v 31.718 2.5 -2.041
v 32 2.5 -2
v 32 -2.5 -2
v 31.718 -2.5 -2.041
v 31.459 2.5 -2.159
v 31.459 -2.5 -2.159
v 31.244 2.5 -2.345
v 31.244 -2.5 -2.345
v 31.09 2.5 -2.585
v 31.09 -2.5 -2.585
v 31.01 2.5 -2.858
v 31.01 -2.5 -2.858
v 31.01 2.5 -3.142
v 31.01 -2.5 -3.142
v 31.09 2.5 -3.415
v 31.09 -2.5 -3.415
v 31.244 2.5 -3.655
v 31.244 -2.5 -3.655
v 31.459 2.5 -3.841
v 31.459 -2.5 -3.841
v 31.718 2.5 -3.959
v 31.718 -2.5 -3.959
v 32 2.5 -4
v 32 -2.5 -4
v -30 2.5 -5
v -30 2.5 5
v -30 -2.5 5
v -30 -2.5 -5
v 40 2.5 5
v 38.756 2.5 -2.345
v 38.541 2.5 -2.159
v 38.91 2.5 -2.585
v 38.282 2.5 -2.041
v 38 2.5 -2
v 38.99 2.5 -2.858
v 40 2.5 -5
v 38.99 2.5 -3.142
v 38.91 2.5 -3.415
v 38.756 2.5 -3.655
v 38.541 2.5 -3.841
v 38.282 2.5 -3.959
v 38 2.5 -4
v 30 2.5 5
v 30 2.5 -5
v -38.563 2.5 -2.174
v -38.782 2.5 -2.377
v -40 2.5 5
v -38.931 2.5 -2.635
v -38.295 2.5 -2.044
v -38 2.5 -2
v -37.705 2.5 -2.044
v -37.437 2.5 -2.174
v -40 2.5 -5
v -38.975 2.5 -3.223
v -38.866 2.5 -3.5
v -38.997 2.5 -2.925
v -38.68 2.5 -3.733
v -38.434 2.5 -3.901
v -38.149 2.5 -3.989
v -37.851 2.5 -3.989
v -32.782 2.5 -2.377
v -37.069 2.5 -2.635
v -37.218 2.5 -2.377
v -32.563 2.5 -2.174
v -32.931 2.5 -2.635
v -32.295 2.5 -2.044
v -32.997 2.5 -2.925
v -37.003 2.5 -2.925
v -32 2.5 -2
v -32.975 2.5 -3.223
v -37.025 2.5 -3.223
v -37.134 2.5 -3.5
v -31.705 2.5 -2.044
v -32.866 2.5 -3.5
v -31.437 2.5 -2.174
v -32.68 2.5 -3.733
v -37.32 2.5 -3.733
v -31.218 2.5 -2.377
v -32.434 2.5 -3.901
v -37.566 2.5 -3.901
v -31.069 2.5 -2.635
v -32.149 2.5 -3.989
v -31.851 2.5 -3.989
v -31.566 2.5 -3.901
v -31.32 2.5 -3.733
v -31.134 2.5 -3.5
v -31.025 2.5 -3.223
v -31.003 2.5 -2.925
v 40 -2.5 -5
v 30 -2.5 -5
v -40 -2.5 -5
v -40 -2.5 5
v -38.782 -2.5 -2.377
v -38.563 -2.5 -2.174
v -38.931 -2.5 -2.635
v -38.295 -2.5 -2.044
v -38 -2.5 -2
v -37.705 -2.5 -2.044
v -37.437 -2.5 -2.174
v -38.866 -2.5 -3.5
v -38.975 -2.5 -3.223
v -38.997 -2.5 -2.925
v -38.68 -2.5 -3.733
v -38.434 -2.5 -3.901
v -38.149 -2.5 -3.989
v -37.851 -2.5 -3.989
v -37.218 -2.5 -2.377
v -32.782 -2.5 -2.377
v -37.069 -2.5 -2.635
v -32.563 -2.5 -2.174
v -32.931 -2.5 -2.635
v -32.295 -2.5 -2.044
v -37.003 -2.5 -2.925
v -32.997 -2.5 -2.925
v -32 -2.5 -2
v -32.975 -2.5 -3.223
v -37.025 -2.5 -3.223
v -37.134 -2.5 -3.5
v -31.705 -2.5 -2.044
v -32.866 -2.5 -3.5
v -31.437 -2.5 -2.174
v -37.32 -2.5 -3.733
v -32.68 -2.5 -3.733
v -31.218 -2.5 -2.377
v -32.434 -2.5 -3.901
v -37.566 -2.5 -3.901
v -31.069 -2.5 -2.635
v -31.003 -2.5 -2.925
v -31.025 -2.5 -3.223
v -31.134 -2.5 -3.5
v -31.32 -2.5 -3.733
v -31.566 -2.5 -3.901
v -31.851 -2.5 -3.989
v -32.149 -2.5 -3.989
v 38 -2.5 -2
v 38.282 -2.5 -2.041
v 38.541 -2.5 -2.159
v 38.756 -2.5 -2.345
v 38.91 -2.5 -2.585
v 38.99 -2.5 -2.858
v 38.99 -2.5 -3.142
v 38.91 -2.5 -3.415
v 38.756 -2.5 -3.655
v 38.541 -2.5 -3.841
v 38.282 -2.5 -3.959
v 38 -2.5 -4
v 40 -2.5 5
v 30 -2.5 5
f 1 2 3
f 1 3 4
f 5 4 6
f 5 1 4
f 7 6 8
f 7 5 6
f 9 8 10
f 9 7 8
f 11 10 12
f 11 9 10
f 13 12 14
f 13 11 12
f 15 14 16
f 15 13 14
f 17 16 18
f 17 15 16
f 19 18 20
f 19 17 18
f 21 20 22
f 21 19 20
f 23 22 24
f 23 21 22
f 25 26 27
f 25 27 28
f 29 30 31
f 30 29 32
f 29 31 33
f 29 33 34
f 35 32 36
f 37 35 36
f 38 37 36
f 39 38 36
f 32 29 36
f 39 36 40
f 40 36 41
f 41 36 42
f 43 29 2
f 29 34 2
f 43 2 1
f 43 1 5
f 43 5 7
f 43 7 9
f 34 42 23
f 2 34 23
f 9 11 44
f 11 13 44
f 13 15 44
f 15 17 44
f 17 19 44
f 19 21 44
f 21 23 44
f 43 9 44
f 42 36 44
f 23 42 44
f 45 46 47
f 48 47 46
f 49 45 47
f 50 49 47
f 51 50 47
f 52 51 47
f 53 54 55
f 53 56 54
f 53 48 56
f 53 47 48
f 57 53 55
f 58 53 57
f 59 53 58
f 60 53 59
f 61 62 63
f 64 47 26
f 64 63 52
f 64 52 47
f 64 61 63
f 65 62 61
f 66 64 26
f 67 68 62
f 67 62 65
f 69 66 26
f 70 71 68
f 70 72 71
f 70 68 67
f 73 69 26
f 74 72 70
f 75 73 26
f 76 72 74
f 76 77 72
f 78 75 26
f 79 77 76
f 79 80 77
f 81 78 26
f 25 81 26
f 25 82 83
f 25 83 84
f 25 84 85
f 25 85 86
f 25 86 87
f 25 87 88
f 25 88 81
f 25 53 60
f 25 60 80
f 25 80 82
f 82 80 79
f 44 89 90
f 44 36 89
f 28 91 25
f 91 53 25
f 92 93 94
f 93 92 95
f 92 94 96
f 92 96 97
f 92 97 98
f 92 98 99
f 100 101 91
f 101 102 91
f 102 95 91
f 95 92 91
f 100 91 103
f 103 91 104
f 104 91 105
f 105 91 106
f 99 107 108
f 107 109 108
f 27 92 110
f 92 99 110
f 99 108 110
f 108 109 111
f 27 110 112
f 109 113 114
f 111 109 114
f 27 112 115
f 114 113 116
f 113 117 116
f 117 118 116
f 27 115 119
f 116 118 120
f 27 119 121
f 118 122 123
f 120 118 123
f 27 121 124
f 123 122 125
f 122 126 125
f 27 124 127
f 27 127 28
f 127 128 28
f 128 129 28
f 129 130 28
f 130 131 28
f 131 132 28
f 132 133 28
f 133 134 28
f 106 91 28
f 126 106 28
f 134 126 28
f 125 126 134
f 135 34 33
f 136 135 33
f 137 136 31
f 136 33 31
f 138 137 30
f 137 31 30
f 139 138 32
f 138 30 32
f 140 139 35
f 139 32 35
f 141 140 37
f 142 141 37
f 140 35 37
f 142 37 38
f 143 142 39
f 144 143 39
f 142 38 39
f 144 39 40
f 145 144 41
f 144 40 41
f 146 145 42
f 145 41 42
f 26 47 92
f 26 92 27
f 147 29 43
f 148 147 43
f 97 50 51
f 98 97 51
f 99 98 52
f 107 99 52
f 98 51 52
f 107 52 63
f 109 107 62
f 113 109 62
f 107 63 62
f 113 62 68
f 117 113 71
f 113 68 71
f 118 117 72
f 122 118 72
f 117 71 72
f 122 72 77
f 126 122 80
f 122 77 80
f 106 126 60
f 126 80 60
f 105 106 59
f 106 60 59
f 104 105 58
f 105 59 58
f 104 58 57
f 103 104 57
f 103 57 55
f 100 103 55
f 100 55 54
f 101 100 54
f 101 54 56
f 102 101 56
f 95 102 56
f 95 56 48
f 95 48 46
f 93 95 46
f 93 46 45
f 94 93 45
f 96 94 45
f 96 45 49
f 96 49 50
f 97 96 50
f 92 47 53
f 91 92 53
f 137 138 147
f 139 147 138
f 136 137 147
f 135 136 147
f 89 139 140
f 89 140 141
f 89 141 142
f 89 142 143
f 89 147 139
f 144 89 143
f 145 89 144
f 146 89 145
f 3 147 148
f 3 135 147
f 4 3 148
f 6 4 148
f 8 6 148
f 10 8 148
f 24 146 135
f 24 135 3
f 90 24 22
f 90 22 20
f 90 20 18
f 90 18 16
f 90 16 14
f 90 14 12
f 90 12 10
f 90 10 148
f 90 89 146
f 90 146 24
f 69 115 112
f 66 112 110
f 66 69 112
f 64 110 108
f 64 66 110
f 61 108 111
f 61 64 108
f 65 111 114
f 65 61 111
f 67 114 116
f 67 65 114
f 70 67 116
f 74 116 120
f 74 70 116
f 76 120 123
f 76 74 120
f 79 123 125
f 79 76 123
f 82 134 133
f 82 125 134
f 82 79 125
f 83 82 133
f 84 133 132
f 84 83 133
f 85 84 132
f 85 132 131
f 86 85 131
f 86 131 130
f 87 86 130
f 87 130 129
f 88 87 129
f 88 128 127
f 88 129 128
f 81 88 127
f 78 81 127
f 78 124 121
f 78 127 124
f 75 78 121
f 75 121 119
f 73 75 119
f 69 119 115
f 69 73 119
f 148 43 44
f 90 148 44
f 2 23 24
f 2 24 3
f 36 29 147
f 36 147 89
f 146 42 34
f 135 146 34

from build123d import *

# Parameters (mm, degrees)
SKETCH1_W           = 10
SKETCH1_H           = 10
BOSS_EXTRUDE1_DEPTH = 2.5
SKETCH3_R           = 1
CUT_EXTRUDE2_DEPTH  = 6
CUT_EXTRUDE3_DEPTH  = 6


with BuildPart() as part:
    # Sketch1 → Boss-Extrude1 (new body, symmetric)
    with BuildSketch(Plane(origin=(0, 0, 0), x_dir=(1, 0, 0), z_dir=(0, 1, 0))):
        with Locations((-35, 0)):
            Rectangle(SKETCH1_W, SKETCH1_H)
    extrude(amount=BOSS_EXTRUDE1_DEPTH, both=True)


with BuildPart() as body_2:
    # Mirror1: mirrored copy
    add(part.part.mirror(Plane(origin=(0, 0, 0), x_dir=(0, 0, 1), z_dir=(1, 0, 0))))

    # Sketch4 → Cut-Extrude3 (cut, through all)
    with BuildSketch(Plane(origin=(0, 2.5, 0), x_dir=(1, 0, 0), z_dir=(0, 1, 0))):
        with BuildLine():
            Line((32, 4), (32, 2))
            ThreePointArc((32, 2), (31, 3), (32, 4))
        make_face()
    cut_extrude3 = extrude(amount=-CUT_EXTRUDE3_DEPTH, mode=Mode.SUBTRACT)

    # Mirror4: Cut-Extrude3 across plane
    add(cut_extrude3.mirror(Plane.ZY.offset(-35)), mode=Mode.SUBTRACT)


with BuildPart() as part_1:
    add(part.part)

    # Sketch3 → Cut-Extrude2 (cut, through all)
    with BuildSketch(Plane(origin=(0, 2.5, 0), x_dir=(1, 0, 0), z_dir=(0, 1, 0))):
        with Locations(Location((-38, 3, 0), (0, 0, 270))):  # turned: the seam where the file's is
            Circle(SKETCH3_R)
    cut_extrude2 = extrude(amount=-CUT_EXTRUDE2_DEPTH, mode=Mode.SUBTRACT)

    # Mirror3: Cut-Extrude2 across plane
    add(cut_extrude2.mirror(Plane.ZY.offset(35)), mode=Mode.SUBTRACT)


solid = Compound([body_2.part, part_1.part])
